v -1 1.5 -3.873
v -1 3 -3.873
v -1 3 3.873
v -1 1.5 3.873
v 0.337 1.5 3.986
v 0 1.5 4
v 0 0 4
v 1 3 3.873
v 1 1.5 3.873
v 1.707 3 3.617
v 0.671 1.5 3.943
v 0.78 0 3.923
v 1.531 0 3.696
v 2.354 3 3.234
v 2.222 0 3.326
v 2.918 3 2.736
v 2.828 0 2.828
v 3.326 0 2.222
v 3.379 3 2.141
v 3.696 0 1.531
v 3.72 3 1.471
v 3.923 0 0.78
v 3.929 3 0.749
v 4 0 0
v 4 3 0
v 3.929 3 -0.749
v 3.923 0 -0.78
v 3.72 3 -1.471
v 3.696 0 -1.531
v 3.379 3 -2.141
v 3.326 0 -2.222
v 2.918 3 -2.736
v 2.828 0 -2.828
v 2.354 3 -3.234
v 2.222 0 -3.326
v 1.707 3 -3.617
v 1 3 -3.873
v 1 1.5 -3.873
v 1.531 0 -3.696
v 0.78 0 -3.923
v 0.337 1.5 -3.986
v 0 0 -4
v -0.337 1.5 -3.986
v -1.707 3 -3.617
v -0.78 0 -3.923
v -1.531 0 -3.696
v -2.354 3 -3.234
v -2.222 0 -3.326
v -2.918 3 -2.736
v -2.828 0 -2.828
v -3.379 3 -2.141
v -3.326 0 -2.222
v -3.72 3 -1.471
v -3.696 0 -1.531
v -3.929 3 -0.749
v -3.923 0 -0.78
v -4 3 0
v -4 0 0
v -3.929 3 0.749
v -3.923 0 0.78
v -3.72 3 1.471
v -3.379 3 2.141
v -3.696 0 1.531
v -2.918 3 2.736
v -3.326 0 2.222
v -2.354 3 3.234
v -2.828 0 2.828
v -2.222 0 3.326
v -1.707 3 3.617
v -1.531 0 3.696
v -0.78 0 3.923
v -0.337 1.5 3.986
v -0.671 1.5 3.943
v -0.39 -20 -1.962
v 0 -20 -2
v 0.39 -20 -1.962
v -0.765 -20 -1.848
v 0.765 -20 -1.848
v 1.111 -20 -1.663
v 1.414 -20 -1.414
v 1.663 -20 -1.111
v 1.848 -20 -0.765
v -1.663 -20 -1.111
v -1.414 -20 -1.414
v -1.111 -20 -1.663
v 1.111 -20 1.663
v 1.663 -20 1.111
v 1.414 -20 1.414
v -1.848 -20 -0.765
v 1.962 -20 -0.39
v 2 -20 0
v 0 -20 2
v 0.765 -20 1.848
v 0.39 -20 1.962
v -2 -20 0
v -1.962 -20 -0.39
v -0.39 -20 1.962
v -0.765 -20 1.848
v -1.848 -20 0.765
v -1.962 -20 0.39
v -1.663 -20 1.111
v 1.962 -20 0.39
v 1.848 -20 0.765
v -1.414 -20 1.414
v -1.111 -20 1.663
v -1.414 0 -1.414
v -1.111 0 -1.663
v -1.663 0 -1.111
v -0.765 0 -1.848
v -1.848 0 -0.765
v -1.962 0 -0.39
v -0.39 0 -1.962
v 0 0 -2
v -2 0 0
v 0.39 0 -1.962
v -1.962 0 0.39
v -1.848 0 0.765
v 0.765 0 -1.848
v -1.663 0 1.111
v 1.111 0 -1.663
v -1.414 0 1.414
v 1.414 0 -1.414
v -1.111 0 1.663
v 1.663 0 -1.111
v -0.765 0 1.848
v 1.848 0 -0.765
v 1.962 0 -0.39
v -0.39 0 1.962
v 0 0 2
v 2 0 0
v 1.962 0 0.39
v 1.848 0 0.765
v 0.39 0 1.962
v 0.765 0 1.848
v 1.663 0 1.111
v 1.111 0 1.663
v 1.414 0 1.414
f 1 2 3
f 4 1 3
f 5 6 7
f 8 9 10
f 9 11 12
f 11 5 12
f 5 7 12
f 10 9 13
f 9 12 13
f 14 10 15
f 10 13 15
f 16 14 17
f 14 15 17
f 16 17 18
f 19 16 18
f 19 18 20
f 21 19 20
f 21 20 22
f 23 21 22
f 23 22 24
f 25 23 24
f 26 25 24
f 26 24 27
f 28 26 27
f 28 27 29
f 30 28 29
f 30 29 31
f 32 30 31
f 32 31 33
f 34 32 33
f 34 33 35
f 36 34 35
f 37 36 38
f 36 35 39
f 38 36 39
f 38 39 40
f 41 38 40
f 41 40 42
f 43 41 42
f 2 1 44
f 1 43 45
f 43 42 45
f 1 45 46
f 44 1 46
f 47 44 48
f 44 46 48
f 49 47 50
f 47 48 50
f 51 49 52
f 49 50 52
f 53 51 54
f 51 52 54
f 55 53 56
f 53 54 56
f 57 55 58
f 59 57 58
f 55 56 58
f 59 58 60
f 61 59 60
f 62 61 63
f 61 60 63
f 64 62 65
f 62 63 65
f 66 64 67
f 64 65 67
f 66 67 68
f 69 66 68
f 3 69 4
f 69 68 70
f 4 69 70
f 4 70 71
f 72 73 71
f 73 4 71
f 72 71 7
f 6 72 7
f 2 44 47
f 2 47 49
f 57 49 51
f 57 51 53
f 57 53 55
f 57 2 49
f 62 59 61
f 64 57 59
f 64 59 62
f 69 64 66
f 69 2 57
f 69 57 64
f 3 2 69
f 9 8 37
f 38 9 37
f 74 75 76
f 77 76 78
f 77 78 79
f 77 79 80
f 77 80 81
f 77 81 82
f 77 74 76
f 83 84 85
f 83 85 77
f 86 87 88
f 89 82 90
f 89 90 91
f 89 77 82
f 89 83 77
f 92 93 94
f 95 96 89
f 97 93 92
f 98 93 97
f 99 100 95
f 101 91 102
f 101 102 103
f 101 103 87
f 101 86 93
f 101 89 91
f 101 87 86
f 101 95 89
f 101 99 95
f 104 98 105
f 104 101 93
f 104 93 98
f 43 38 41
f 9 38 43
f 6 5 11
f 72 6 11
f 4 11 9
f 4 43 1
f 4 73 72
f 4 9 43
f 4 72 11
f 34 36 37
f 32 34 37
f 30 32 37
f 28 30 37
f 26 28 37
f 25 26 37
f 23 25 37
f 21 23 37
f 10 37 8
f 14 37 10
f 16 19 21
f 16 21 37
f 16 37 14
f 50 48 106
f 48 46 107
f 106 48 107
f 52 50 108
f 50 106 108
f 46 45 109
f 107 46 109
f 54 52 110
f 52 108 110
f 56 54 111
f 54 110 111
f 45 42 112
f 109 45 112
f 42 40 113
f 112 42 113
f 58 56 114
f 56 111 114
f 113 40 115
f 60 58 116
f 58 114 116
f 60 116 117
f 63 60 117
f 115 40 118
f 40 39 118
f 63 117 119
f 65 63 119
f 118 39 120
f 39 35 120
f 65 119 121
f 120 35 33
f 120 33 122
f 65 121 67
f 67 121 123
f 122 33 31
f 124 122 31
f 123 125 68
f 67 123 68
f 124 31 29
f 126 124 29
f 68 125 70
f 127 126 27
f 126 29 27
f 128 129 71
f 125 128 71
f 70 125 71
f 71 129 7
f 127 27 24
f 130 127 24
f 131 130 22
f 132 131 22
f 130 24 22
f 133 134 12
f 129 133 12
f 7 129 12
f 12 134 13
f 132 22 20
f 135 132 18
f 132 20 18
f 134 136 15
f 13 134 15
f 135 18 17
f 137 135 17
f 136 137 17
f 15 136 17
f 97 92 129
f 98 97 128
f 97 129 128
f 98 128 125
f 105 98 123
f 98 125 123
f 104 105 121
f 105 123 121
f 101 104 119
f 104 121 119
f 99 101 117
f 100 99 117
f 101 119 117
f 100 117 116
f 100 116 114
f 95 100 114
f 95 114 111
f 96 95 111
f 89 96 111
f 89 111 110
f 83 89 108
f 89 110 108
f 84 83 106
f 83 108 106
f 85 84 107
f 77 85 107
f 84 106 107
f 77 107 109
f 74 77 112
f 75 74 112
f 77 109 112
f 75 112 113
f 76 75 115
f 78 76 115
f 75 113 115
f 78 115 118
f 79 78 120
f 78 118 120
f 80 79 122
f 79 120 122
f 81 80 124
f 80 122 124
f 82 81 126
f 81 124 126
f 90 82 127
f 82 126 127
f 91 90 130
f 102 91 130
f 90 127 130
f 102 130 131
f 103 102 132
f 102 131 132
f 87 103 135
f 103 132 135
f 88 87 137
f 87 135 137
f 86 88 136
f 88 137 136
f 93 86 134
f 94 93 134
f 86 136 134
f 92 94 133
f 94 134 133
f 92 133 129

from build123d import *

# Parameters (mm, degrees)
SKETCH1_R          = 4
EXTRUDE1_DEPTH     = 3
CUT_EXTRUDE1_DEPTH = 1.5
SKETCH3_R          = 2
EXTRUDE2_DEPTH     = 20


with BuildPart() as part:
    # Sketch1 → Extrude1 (new body)
    with BuildSketch(Plane(origin=(0, 0, 0), x_dir=(1, 0, 0), z_dir=(0, 1, 0))):
        with Locations(Location((0, 0, 0), (0, 0, 270))):  # turned: the seam where the file's is
            Circle(SKETCH1_R)
    extrude(amount=EXTRUDE1_DEPTH)

    # Sketch2 → Cut-Extrude1 (cut)
    with BuildSketch(Plane(origin=(0, 3, 0), x_dir=(-1, 0, 0), z_dir=(0, 1, 0))):
        Polygon((0, 4.401224563), (-1, 4.401224563), (-1, -5.078336035), (1, -5.078336035), (1, 4.401224563), align=None)
    extrude(amount=-CUT_EXTRUDE1_DEPTH, mode=Mode.SUBTRACT)

    # Sketch3 → Extrude2 (add)
    with BuildSketch(Plane.XZ):
        with Locations(Location((0, 0, 0), (0, 0, 90))):  # turned: the seam where the file's is
            Circle(SKETCH3_R)
    extrude(amount=EXTRUDE2_DEPTH)


solid = part.part
